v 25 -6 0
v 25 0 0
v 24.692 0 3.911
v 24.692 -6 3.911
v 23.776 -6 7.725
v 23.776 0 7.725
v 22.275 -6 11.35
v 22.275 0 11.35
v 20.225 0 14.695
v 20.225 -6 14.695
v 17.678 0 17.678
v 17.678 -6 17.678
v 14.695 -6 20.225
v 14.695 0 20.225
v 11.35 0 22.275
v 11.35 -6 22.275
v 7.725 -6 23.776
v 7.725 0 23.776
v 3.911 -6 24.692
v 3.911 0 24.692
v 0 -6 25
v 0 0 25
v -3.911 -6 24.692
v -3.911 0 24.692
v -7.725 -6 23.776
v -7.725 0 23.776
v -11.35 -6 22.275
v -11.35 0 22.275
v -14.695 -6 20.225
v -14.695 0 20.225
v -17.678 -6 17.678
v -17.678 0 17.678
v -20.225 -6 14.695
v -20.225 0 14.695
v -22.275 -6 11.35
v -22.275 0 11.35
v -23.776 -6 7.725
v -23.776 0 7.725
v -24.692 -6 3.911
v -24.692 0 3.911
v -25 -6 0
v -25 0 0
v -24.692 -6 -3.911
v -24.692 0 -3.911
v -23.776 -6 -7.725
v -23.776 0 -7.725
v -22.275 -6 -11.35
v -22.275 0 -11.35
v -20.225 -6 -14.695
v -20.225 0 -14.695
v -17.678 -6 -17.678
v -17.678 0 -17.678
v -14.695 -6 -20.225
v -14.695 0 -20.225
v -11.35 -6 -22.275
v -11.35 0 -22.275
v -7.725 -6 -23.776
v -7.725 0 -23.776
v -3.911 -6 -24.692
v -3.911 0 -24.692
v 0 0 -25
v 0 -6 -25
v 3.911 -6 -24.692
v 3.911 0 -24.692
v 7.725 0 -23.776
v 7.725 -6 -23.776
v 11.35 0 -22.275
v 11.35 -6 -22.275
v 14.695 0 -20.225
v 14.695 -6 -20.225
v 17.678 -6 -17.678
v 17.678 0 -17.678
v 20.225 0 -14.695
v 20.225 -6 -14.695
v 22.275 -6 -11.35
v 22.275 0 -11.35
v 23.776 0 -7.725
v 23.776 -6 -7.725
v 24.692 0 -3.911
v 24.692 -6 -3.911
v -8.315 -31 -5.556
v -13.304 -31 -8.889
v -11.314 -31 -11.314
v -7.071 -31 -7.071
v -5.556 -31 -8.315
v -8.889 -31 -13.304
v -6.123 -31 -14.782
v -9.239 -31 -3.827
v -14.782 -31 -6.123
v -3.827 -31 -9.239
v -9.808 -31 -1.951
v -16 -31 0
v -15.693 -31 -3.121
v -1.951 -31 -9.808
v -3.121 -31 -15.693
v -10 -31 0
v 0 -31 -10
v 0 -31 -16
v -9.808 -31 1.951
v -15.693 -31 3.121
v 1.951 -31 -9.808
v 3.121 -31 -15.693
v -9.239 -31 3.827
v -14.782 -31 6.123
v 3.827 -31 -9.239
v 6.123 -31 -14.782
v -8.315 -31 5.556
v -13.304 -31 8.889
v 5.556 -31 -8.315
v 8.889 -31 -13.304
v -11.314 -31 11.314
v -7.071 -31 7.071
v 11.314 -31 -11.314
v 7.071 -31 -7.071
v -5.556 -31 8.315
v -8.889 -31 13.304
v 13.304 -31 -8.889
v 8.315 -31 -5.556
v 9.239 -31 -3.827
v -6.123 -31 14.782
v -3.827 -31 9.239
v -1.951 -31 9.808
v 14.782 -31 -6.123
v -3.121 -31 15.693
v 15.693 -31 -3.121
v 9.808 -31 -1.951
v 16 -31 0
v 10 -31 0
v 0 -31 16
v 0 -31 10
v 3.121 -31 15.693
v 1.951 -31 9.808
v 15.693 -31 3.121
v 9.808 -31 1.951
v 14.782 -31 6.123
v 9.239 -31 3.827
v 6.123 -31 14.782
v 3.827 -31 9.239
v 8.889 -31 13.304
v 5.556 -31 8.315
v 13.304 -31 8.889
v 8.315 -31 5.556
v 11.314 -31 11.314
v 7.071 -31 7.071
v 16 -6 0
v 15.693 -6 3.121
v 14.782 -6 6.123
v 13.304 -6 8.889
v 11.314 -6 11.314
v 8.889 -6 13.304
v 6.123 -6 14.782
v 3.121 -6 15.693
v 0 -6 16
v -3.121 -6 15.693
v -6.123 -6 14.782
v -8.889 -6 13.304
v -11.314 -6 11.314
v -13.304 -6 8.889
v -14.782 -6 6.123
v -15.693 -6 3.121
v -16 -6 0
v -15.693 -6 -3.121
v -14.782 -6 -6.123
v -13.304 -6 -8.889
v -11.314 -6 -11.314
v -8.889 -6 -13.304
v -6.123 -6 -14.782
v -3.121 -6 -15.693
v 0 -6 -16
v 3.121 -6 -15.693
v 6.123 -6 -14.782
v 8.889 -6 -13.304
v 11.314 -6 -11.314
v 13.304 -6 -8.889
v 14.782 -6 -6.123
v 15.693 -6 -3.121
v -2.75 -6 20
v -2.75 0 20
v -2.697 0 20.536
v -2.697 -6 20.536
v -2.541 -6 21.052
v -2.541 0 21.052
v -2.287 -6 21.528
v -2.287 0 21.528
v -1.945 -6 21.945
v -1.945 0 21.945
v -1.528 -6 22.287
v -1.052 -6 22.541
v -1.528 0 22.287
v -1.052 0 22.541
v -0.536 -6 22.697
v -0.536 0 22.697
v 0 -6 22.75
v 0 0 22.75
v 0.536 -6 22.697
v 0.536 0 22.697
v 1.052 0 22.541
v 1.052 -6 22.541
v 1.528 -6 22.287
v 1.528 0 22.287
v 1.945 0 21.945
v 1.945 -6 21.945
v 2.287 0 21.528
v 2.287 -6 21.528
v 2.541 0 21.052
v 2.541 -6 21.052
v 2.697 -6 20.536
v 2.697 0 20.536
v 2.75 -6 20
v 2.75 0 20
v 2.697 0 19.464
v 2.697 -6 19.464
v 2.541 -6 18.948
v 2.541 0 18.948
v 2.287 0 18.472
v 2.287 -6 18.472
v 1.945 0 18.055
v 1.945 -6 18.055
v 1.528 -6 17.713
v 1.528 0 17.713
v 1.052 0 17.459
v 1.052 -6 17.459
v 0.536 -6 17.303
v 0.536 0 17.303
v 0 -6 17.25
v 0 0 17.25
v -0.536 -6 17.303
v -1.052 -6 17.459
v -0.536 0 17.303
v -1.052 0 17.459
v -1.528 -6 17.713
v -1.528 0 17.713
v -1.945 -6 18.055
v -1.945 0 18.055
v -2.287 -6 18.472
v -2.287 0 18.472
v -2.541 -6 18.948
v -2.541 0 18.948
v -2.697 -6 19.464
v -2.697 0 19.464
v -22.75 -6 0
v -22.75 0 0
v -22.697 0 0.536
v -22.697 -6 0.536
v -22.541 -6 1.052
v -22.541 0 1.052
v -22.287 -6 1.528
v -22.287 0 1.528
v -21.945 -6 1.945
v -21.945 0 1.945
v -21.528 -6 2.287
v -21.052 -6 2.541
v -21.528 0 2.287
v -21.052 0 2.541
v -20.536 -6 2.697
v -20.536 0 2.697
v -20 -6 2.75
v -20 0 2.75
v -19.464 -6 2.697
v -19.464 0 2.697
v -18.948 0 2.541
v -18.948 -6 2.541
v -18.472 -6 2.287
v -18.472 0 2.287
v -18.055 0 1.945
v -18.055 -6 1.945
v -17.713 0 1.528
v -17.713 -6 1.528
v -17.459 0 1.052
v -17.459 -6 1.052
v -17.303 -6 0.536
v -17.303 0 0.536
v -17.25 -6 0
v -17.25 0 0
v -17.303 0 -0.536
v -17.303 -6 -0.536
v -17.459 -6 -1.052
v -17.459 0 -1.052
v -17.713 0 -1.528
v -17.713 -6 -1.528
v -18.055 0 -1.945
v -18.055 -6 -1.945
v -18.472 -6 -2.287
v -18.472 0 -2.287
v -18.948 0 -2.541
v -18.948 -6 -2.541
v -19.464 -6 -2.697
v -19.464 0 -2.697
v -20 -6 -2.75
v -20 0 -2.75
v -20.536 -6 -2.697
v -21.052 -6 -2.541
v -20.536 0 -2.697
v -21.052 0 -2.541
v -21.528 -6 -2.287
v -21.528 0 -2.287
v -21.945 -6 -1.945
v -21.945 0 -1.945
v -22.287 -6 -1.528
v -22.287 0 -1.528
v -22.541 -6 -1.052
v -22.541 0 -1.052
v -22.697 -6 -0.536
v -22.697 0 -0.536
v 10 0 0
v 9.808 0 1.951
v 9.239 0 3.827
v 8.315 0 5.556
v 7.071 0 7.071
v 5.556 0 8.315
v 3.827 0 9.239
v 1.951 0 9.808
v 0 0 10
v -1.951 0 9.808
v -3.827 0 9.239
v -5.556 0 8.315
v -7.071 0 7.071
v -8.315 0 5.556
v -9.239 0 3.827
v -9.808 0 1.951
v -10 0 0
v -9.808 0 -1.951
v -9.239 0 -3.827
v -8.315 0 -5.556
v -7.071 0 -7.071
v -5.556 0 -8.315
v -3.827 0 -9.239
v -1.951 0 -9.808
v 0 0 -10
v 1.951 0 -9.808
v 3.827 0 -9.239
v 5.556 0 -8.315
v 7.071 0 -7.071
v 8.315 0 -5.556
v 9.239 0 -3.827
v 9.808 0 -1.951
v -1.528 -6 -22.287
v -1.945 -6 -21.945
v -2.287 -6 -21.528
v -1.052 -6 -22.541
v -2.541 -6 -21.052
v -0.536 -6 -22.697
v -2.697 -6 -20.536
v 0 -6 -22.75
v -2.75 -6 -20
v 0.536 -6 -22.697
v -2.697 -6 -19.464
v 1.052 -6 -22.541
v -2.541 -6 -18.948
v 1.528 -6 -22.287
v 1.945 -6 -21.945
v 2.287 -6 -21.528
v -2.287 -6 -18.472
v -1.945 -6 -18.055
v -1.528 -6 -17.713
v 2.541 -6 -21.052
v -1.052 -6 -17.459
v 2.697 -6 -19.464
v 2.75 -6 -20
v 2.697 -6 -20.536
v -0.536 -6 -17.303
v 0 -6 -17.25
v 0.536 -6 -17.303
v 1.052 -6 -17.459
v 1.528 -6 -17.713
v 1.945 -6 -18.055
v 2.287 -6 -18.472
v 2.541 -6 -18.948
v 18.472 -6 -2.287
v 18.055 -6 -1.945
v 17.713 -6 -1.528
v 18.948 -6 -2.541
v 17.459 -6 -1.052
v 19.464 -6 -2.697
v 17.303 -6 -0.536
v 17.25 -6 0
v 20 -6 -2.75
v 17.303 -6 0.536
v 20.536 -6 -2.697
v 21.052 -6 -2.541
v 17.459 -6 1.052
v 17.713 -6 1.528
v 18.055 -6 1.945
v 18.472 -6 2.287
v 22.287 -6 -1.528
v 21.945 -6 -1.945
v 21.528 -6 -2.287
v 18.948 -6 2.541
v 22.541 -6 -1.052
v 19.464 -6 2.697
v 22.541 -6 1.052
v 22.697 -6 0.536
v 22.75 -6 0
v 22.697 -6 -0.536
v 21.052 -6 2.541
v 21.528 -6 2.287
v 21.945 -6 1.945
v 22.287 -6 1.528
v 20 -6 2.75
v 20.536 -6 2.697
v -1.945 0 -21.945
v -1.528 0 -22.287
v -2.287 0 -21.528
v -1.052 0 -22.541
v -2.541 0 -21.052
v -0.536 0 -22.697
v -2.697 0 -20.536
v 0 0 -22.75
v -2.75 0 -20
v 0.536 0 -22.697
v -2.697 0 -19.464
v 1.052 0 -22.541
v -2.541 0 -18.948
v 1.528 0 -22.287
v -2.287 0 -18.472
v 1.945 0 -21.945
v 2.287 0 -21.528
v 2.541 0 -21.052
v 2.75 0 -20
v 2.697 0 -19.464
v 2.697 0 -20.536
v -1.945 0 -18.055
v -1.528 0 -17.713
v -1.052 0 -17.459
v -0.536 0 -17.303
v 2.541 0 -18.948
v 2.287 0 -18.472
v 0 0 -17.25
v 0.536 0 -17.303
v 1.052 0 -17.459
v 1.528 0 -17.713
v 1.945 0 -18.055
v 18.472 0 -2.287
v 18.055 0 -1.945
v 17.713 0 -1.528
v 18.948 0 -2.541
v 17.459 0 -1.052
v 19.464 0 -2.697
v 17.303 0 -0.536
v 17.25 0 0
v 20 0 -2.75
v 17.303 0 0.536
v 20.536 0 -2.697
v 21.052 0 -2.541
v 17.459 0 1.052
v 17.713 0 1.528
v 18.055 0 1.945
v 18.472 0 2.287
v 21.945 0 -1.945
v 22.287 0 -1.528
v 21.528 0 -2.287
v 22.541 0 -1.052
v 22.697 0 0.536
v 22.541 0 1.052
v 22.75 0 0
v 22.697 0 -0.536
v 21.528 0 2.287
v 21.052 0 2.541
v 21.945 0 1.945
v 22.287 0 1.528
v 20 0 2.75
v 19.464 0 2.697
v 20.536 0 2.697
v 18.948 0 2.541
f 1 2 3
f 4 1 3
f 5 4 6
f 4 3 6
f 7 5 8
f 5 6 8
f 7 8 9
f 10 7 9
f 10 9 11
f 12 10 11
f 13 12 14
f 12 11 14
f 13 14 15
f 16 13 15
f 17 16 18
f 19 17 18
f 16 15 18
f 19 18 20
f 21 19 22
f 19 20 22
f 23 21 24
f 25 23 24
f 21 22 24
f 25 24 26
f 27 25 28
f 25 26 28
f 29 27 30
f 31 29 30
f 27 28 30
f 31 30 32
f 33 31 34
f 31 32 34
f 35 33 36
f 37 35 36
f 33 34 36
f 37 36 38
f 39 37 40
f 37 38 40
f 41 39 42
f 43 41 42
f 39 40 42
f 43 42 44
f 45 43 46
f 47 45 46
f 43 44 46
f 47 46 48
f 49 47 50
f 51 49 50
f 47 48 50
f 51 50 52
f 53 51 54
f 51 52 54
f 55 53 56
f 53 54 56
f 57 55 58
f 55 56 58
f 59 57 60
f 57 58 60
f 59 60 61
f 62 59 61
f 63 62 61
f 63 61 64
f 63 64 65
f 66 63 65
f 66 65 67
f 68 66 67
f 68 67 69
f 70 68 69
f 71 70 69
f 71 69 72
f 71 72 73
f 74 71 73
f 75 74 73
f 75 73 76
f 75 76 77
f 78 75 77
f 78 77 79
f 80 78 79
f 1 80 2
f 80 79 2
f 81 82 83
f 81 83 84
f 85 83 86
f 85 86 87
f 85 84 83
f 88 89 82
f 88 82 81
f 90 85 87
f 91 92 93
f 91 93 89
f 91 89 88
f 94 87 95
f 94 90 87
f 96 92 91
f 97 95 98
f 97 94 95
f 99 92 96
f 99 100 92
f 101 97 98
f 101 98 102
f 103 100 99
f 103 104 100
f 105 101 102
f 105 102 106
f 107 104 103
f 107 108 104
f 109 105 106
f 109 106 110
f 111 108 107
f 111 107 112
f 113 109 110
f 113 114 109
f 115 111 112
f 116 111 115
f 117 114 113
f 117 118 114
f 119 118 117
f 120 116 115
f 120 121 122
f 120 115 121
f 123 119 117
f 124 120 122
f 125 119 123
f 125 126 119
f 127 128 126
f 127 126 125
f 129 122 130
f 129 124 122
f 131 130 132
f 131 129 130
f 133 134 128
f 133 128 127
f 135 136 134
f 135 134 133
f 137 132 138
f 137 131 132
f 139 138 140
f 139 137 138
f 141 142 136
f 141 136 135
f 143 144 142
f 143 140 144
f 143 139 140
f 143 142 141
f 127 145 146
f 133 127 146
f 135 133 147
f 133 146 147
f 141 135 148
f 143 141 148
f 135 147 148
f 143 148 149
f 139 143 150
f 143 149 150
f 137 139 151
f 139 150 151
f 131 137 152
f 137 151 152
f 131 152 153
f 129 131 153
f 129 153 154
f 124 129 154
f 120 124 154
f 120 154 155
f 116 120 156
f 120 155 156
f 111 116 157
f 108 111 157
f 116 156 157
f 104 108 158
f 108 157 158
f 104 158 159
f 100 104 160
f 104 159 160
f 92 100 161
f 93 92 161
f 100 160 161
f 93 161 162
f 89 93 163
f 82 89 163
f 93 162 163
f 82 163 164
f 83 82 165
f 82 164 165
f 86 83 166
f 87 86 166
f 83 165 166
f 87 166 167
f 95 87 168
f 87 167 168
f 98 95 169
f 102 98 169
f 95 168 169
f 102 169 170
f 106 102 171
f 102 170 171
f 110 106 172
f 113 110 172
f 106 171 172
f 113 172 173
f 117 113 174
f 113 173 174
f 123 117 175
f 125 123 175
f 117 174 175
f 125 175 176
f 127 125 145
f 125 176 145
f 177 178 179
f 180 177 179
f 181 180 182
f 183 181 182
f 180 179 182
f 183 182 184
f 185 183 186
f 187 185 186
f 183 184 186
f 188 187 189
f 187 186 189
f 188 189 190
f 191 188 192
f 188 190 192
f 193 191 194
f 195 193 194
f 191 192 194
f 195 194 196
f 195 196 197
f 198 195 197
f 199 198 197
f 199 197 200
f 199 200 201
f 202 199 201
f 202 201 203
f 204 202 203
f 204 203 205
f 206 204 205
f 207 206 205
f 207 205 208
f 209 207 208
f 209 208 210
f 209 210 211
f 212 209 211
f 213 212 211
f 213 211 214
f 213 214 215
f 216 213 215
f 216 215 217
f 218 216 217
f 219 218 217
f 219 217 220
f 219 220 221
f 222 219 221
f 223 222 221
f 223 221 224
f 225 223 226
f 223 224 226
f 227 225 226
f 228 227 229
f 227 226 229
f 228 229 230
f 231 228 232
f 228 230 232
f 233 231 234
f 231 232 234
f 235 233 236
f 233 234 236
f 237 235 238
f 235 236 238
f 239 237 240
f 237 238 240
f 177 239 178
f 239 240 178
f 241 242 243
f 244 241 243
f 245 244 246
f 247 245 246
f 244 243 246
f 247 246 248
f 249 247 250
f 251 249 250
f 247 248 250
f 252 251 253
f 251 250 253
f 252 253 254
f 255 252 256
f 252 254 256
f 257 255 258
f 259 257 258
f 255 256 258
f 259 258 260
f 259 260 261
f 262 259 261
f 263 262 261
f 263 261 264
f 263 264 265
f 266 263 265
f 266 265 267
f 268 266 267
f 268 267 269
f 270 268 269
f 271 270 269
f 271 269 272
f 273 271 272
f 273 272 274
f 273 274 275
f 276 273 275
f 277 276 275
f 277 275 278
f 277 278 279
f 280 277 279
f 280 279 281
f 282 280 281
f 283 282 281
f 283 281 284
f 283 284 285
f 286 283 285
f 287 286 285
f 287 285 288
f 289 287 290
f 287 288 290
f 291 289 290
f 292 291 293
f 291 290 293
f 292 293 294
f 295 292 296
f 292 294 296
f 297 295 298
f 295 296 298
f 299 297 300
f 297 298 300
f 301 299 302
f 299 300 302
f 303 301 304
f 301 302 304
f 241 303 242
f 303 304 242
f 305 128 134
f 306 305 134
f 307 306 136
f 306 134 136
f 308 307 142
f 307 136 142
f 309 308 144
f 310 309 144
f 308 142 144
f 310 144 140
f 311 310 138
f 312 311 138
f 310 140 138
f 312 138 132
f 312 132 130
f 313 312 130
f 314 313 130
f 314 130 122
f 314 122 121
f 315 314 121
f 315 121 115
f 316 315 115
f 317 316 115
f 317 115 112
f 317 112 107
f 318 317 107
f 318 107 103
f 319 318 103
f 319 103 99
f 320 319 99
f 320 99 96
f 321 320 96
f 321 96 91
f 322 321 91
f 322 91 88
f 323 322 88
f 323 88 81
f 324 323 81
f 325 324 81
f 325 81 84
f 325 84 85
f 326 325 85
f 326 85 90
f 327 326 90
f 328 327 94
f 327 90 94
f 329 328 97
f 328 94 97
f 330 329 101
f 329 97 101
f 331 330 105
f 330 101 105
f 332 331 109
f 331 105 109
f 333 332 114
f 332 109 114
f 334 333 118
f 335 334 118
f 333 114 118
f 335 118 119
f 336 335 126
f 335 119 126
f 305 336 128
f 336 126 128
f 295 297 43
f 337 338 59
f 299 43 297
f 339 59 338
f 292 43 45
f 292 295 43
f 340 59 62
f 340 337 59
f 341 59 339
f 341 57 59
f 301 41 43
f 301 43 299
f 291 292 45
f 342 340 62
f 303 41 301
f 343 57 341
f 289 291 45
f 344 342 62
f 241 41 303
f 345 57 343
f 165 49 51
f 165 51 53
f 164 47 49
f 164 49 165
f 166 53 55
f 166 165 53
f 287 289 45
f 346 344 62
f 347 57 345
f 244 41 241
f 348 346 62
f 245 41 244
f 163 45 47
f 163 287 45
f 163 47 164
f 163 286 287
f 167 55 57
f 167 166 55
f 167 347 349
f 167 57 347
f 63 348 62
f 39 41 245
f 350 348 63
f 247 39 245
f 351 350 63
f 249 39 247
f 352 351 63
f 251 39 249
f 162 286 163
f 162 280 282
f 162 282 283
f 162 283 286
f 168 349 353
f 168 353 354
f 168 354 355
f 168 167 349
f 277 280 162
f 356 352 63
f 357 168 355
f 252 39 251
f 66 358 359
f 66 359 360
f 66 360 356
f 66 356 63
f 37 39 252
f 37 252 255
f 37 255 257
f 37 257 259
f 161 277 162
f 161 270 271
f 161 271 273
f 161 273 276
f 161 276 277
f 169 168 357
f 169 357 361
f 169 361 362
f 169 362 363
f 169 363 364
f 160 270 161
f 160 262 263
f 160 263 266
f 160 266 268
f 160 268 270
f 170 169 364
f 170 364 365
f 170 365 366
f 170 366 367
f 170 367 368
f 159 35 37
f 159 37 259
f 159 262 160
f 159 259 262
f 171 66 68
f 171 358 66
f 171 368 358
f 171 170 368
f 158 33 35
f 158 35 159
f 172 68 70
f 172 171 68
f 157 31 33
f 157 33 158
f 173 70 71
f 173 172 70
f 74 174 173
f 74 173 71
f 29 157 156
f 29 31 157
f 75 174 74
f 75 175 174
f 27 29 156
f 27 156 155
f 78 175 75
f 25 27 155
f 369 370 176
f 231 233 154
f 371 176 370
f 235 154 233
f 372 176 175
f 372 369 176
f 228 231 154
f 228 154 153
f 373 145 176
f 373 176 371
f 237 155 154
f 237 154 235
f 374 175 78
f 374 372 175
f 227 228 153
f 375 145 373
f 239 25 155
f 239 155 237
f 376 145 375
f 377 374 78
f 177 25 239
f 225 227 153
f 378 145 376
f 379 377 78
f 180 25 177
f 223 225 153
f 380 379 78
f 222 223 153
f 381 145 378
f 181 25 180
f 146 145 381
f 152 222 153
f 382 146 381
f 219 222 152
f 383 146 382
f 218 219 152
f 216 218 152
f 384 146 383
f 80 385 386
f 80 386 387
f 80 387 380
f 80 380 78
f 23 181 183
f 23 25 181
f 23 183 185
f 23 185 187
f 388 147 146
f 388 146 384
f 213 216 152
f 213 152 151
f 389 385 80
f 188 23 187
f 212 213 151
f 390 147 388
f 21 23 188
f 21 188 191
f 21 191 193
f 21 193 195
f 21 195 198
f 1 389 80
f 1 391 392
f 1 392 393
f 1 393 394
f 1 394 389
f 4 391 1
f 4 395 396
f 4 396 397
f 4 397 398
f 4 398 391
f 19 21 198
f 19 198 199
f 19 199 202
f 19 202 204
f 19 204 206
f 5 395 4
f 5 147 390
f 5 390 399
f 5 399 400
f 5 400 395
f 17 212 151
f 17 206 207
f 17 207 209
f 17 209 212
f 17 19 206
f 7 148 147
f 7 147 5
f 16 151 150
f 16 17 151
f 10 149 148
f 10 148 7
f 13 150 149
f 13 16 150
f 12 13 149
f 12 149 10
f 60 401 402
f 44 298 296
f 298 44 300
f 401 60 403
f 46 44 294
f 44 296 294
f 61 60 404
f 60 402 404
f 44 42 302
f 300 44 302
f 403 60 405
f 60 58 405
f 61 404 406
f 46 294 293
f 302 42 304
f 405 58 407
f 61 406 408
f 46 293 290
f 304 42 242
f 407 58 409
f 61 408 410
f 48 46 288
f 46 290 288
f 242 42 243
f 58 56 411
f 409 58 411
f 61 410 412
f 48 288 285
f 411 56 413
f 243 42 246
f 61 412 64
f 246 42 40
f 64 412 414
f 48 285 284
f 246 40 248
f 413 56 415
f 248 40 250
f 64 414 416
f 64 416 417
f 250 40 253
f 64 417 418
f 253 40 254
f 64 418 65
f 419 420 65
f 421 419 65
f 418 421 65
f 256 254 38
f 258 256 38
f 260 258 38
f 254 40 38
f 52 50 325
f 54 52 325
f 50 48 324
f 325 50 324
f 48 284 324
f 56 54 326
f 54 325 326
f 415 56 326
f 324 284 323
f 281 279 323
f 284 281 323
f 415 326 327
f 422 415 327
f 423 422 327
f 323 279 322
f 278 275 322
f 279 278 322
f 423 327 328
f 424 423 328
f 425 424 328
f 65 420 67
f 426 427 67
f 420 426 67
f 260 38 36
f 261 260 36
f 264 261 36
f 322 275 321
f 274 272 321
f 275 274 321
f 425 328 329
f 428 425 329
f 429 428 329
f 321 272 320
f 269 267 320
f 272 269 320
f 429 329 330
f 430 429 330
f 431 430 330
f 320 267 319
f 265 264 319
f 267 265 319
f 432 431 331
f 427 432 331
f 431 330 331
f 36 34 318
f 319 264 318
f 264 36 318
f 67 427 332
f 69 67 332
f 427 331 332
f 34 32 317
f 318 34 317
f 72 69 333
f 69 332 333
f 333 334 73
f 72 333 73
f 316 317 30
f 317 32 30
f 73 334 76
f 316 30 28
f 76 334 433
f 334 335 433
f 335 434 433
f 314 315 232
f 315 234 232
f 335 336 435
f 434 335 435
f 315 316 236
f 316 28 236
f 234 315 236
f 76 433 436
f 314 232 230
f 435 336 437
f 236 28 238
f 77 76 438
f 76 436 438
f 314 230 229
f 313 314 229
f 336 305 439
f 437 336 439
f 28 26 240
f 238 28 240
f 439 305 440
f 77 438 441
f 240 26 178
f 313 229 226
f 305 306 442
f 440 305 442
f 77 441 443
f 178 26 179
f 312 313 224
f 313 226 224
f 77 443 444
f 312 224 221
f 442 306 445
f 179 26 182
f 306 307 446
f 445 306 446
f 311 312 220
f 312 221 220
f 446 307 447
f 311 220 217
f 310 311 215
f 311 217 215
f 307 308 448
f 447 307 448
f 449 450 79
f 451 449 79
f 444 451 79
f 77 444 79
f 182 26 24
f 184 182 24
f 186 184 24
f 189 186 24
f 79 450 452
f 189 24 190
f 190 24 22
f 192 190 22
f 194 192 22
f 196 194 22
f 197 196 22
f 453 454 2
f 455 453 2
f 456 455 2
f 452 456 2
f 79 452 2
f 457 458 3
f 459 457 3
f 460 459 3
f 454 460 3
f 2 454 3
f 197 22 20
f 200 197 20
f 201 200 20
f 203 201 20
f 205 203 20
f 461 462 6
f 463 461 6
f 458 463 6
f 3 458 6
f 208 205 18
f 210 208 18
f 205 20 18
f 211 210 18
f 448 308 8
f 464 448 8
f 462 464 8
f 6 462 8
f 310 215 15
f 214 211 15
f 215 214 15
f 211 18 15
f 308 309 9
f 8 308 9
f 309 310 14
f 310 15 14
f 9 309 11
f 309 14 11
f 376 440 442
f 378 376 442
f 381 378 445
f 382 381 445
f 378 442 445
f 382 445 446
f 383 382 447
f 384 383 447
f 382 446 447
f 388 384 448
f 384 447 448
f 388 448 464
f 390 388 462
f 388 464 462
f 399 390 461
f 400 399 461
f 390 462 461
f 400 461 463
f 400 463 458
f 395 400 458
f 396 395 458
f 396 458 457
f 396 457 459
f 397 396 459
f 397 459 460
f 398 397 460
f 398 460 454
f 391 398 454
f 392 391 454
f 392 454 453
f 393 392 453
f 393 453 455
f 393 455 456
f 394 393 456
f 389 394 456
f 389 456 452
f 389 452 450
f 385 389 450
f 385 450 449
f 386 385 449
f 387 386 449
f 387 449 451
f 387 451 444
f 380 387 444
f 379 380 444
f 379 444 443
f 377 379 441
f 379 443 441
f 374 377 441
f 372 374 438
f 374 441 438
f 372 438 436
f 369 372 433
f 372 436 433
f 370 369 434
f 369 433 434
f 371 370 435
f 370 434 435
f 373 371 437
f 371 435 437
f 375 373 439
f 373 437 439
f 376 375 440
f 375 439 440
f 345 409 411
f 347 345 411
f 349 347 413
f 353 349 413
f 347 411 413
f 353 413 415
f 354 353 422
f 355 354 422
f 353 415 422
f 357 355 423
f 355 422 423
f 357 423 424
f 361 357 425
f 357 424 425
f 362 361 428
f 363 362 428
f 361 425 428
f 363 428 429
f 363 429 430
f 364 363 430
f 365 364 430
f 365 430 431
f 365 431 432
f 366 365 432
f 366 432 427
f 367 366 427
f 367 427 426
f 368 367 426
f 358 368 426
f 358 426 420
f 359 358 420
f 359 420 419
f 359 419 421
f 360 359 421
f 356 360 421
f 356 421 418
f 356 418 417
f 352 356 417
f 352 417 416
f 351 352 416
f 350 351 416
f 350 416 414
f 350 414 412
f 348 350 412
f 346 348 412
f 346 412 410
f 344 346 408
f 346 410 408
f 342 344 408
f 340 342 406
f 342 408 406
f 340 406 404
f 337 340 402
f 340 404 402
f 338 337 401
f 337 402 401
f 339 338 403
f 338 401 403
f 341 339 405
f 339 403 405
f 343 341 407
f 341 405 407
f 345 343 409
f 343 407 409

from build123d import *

# Parameters (mm, degrees)
F0_R     = 25
F1_DEPTH = 6
F2_R     = 16
F3_DEPTH = 25
F4_R     = 2.75
F5_DEPTH = 31.001
F7_D     = 20


with BuildPart() as f1:
    # F0 (on Front) → F1 (new body)
    with BuildSketch(Plane.XZ):
        Circle(F0_R)
    extrude(amount=F1_DEPTH)

    # F2 (on face) → F3 (join)
    with BuildSketch(Plane.XZ.offset(6)):
        Circle(F2_R)
    extrude(amount=F3_DEPTH)

    # F4 (on face) → F5 (cut, through all)
    with BuildSketch(Plane(origin=(0, 0, 0), x_dir=(-1, 0, 0), z_dir=(0, 1, 0))):
        with Locations((0, 20)):
            Circle(F4_R)
        with Locations((-20, 0)):
            Circle(F4_R)
        with Locations((20, 0)):
            Circle(F4_R)
        with Locations((0, -20)):
            Circle(F4_R)
    extrude(amount=-F5_DEPTH, mode=Mode.SUBTRACT)

    # F7 (through all)
    with Locations(Plane(origin=(0, 0, 0), x_dir=(-1, 0, 0), z_dir=(0, 1, 0))):
        with Locations((0, 0)):
            Hole(F7_D / 2)


solid = f1.part
